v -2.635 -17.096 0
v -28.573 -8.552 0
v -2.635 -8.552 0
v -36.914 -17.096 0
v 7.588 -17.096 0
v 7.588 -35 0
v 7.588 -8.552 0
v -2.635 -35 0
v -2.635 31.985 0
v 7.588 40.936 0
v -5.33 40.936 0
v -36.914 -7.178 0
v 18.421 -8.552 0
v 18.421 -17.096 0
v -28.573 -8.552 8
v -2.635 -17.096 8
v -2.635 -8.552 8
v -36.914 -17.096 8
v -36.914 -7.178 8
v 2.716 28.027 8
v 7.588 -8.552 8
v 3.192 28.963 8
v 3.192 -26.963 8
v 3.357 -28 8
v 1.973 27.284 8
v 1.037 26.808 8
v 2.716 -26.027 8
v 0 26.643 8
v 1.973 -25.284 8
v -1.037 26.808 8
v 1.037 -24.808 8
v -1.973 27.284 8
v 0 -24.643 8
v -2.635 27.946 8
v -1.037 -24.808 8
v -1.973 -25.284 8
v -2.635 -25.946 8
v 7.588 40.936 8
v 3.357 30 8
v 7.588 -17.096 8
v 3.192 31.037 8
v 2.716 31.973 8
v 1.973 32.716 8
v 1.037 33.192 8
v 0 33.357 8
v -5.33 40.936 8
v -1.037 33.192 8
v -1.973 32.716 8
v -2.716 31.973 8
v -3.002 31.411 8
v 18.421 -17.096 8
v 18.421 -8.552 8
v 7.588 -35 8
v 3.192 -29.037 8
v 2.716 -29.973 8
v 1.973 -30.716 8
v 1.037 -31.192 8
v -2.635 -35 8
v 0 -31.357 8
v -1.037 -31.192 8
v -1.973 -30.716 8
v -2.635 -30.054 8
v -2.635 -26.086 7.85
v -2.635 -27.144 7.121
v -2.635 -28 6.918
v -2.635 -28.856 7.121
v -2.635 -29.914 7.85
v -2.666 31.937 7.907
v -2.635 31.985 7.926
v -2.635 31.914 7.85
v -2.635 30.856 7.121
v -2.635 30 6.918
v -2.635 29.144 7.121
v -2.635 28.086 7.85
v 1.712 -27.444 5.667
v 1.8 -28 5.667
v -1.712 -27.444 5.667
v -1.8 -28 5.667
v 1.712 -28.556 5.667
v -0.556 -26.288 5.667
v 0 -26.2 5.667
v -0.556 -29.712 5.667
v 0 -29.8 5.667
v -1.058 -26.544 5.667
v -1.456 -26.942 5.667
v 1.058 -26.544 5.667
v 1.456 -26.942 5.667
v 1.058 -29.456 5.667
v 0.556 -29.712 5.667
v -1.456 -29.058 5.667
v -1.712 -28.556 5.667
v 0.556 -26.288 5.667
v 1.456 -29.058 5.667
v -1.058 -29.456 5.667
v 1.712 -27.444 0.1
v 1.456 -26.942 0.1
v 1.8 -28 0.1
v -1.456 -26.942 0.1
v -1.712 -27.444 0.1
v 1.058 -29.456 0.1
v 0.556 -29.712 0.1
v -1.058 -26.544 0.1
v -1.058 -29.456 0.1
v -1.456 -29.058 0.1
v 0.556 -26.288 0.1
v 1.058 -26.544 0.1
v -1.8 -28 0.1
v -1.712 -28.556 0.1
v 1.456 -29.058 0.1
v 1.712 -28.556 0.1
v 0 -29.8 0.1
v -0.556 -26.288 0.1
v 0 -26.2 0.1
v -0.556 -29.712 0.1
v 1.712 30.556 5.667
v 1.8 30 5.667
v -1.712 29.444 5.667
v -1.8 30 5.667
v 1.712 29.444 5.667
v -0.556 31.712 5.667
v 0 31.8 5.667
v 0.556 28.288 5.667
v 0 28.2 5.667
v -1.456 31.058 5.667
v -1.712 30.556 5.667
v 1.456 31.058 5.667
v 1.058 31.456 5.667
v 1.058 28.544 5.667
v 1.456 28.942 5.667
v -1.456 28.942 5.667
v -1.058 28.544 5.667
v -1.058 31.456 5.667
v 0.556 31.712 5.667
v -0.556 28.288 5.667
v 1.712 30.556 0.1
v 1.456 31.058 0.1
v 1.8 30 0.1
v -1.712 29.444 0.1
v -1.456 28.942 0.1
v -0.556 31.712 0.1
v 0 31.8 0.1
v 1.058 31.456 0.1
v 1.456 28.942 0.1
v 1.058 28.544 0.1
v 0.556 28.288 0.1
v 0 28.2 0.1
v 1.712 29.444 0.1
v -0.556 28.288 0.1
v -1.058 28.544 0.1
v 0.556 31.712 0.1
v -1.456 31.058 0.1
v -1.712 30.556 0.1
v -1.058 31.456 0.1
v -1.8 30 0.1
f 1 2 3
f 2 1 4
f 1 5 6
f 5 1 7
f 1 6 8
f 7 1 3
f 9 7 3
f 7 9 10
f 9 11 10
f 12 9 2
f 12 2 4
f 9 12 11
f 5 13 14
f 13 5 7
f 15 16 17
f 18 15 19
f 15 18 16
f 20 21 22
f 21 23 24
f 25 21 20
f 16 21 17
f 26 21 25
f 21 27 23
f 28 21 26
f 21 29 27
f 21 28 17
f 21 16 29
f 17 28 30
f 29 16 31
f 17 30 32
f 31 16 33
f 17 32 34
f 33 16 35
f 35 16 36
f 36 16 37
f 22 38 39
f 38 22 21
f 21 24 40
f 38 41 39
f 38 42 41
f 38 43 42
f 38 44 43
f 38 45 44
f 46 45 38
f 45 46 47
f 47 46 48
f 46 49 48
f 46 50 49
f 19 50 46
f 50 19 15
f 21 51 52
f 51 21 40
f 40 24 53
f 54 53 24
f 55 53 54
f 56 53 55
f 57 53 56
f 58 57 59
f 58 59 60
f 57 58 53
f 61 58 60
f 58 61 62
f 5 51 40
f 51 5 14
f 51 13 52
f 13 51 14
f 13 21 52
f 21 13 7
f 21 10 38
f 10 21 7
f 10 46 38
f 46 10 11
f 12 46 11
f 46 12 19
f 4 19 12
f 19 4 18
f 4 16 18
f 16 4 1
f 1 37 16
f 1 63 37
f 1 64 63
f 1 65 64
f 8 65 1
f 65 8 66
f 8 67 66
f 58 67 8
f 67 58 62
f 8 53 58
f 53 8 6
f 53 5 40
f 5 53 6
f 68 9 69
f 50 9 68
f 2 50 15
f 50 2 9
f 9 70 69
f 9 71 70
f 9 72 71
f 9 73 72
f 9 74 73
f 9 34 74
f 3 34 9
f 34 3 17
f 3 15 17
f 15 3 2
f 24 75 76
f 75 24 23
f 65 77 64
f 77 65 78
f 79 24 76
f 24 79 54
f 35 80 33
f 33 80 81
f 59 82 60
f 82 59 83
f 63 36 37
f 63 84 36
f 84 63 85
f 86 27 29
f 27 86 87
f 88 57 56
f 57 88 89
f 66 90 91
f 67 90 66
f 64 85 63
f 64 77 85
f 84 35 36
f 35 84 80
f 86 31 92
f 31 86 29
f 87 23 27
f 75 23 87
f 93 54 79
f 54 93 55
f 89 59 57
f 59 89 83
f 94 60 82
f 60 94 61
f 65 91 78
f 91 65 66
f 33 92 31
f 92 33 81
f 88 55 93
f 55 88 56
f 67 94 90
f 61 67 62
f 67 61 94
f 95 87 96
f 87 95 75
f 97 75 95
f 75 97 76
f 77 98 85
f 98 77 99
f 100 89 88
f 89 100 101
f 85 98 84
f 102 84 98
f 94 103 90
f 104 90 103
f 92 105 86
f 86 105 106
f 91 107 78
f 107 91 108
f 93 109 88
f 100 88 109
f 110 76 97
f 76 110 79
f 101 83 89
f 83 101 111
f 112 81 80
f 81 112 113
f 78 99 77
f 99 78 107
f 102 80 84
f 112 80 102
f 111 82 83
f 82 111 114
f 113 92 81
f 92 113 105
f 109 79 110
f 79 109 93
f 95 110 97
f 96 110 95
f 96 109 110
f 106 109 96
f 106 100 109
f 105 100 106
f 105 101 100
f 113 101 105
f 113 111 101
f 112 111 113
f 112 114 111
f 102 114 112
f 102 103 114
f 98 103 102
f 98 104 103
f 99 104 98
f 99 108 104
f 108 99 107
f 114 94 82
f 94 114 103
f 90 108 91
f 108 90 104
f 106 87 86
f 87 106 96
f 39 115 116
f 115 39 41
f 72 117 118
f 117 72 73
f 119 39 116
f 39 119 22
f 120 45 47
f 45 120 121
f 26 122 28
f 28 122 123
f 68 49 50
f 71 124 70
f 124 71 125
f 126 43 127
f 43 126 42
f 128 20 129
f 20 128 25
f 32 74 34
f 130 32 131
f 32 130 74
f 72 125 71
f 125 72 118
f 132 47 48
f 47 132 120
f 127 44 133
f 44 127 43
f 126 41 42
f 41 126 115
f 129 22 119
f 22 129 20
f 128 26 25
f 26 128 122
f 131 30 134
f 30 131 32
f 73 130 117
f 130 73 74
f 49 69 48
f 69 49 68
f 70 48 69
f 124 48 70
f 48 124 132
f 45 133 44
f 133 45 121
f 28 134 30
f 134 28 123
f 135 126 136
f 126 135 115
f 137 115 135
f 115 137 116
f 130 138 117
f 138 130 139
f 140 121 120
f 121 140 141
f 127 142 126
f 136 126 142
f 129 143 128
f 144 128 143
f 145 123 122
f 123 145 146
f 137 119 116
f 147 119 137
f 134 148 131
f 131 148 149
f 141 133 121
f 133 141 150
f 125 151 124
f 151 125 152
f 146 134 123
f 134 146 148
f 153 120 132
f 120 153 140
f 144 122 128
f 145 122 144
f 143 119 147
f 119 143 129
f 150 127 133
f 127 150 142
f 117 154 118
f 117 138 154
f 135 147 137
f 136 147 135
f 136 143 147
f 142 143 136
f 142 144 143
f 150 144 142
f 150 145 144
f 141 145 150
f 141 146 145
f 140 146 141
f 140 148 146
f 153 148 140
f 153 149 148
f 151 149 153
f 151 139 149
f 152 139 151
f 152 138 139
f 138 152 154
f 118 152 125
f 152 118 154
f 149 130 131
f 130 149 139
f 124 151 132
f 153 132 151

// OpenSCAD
// Street Numbers for 3D printing
// Charles Tilford, 2019
// License: CC BY-NC-SA 4.0
//   https://creativecommons.org/licenses/by-nc-sa/4.0/

char="4";     // The number/letter to print

// Units are in mm, except for height of letter

// How many inches high should letter be?
inchesHigh=3;
// How thick/deep should letter be (mm)?
depth=8;

// Character coordinates just center the letter
charX=-42;    // Character X coord
charY=-35;    // Character Y coord
topScrew=30;  // Top screw Y coord
botScrew=-28; // Bottom screw Y coord
height=8;     // Thickness of character
// Screw dimensions. Default presumes
// #6 sheet metal screw
screwWid=3.6; // Width of screw shaft
screwTop=6.78;// Width of screw head
screwCon=5.08;// Height of head 'cone'

// Font to print in. Your system needs this
// installed, of course. If changed the hole
// positions almost certainly need to be
// changed, and maybe charX/charY.
fName="Open Sans Extrabold";
// https://fonts.google.com/specimen/Open+Sans
// Designer: Steve Matteson

// Thin floor below holes. My printer was
// struggling to have the hole 'border' stick
// to the stage. Just drill/screw thru it.
holeFloor=0.1; 

// ==========================================
// ===== All values below are auto-calculated
// ==========================================

// Scaled values
scaleFactor=inchesHigh / 3;
cX=charX * scaleFactor;
cY=charY * scaleFactor;
tS=topScrew * scaleFactor;
bS=botScrew * scaleFactor;
// Where do we start drawing screw head cone?
oS=depth - (screwCon-.05);

difference() {
  // We use difference() to punch out the screw holes
  // in the character
    
  // The character itself, 8mm thick
  translate([cX,cY,0])
    linear_extrude(height=depth, scale=1)
    text(char, size=(75*scaleFactor),
         $fn=100, font=fName);
    
  // Bottom screw hole
  translate([0,bS,oS]) color("red")
    cylinder(h=screwCon, d2=screwTop,
             d1=0, $fn=20);
   translate([0,bS,holeFloor])
    cylinder(h=20, d=screwWid, $fn=20);
    
  // Top screw hole
  translate([0,tS,oS]) color("red")
    cylinder(h=screwCon, d2=screwTop,
             d1=0, $fn=20);
  translate([0,tS,holeFloor])
    cylinder(h=20, d=screwWid, $fn=20);
}

// Colors are just to aid visualization of
// void spaces. $fn is "featuer number", ie how
// many polygons are devoted to object. The values
// above should be near your printing limit anyway.

// Developed in OpenSCAD
//    https://www.openscad.org/
